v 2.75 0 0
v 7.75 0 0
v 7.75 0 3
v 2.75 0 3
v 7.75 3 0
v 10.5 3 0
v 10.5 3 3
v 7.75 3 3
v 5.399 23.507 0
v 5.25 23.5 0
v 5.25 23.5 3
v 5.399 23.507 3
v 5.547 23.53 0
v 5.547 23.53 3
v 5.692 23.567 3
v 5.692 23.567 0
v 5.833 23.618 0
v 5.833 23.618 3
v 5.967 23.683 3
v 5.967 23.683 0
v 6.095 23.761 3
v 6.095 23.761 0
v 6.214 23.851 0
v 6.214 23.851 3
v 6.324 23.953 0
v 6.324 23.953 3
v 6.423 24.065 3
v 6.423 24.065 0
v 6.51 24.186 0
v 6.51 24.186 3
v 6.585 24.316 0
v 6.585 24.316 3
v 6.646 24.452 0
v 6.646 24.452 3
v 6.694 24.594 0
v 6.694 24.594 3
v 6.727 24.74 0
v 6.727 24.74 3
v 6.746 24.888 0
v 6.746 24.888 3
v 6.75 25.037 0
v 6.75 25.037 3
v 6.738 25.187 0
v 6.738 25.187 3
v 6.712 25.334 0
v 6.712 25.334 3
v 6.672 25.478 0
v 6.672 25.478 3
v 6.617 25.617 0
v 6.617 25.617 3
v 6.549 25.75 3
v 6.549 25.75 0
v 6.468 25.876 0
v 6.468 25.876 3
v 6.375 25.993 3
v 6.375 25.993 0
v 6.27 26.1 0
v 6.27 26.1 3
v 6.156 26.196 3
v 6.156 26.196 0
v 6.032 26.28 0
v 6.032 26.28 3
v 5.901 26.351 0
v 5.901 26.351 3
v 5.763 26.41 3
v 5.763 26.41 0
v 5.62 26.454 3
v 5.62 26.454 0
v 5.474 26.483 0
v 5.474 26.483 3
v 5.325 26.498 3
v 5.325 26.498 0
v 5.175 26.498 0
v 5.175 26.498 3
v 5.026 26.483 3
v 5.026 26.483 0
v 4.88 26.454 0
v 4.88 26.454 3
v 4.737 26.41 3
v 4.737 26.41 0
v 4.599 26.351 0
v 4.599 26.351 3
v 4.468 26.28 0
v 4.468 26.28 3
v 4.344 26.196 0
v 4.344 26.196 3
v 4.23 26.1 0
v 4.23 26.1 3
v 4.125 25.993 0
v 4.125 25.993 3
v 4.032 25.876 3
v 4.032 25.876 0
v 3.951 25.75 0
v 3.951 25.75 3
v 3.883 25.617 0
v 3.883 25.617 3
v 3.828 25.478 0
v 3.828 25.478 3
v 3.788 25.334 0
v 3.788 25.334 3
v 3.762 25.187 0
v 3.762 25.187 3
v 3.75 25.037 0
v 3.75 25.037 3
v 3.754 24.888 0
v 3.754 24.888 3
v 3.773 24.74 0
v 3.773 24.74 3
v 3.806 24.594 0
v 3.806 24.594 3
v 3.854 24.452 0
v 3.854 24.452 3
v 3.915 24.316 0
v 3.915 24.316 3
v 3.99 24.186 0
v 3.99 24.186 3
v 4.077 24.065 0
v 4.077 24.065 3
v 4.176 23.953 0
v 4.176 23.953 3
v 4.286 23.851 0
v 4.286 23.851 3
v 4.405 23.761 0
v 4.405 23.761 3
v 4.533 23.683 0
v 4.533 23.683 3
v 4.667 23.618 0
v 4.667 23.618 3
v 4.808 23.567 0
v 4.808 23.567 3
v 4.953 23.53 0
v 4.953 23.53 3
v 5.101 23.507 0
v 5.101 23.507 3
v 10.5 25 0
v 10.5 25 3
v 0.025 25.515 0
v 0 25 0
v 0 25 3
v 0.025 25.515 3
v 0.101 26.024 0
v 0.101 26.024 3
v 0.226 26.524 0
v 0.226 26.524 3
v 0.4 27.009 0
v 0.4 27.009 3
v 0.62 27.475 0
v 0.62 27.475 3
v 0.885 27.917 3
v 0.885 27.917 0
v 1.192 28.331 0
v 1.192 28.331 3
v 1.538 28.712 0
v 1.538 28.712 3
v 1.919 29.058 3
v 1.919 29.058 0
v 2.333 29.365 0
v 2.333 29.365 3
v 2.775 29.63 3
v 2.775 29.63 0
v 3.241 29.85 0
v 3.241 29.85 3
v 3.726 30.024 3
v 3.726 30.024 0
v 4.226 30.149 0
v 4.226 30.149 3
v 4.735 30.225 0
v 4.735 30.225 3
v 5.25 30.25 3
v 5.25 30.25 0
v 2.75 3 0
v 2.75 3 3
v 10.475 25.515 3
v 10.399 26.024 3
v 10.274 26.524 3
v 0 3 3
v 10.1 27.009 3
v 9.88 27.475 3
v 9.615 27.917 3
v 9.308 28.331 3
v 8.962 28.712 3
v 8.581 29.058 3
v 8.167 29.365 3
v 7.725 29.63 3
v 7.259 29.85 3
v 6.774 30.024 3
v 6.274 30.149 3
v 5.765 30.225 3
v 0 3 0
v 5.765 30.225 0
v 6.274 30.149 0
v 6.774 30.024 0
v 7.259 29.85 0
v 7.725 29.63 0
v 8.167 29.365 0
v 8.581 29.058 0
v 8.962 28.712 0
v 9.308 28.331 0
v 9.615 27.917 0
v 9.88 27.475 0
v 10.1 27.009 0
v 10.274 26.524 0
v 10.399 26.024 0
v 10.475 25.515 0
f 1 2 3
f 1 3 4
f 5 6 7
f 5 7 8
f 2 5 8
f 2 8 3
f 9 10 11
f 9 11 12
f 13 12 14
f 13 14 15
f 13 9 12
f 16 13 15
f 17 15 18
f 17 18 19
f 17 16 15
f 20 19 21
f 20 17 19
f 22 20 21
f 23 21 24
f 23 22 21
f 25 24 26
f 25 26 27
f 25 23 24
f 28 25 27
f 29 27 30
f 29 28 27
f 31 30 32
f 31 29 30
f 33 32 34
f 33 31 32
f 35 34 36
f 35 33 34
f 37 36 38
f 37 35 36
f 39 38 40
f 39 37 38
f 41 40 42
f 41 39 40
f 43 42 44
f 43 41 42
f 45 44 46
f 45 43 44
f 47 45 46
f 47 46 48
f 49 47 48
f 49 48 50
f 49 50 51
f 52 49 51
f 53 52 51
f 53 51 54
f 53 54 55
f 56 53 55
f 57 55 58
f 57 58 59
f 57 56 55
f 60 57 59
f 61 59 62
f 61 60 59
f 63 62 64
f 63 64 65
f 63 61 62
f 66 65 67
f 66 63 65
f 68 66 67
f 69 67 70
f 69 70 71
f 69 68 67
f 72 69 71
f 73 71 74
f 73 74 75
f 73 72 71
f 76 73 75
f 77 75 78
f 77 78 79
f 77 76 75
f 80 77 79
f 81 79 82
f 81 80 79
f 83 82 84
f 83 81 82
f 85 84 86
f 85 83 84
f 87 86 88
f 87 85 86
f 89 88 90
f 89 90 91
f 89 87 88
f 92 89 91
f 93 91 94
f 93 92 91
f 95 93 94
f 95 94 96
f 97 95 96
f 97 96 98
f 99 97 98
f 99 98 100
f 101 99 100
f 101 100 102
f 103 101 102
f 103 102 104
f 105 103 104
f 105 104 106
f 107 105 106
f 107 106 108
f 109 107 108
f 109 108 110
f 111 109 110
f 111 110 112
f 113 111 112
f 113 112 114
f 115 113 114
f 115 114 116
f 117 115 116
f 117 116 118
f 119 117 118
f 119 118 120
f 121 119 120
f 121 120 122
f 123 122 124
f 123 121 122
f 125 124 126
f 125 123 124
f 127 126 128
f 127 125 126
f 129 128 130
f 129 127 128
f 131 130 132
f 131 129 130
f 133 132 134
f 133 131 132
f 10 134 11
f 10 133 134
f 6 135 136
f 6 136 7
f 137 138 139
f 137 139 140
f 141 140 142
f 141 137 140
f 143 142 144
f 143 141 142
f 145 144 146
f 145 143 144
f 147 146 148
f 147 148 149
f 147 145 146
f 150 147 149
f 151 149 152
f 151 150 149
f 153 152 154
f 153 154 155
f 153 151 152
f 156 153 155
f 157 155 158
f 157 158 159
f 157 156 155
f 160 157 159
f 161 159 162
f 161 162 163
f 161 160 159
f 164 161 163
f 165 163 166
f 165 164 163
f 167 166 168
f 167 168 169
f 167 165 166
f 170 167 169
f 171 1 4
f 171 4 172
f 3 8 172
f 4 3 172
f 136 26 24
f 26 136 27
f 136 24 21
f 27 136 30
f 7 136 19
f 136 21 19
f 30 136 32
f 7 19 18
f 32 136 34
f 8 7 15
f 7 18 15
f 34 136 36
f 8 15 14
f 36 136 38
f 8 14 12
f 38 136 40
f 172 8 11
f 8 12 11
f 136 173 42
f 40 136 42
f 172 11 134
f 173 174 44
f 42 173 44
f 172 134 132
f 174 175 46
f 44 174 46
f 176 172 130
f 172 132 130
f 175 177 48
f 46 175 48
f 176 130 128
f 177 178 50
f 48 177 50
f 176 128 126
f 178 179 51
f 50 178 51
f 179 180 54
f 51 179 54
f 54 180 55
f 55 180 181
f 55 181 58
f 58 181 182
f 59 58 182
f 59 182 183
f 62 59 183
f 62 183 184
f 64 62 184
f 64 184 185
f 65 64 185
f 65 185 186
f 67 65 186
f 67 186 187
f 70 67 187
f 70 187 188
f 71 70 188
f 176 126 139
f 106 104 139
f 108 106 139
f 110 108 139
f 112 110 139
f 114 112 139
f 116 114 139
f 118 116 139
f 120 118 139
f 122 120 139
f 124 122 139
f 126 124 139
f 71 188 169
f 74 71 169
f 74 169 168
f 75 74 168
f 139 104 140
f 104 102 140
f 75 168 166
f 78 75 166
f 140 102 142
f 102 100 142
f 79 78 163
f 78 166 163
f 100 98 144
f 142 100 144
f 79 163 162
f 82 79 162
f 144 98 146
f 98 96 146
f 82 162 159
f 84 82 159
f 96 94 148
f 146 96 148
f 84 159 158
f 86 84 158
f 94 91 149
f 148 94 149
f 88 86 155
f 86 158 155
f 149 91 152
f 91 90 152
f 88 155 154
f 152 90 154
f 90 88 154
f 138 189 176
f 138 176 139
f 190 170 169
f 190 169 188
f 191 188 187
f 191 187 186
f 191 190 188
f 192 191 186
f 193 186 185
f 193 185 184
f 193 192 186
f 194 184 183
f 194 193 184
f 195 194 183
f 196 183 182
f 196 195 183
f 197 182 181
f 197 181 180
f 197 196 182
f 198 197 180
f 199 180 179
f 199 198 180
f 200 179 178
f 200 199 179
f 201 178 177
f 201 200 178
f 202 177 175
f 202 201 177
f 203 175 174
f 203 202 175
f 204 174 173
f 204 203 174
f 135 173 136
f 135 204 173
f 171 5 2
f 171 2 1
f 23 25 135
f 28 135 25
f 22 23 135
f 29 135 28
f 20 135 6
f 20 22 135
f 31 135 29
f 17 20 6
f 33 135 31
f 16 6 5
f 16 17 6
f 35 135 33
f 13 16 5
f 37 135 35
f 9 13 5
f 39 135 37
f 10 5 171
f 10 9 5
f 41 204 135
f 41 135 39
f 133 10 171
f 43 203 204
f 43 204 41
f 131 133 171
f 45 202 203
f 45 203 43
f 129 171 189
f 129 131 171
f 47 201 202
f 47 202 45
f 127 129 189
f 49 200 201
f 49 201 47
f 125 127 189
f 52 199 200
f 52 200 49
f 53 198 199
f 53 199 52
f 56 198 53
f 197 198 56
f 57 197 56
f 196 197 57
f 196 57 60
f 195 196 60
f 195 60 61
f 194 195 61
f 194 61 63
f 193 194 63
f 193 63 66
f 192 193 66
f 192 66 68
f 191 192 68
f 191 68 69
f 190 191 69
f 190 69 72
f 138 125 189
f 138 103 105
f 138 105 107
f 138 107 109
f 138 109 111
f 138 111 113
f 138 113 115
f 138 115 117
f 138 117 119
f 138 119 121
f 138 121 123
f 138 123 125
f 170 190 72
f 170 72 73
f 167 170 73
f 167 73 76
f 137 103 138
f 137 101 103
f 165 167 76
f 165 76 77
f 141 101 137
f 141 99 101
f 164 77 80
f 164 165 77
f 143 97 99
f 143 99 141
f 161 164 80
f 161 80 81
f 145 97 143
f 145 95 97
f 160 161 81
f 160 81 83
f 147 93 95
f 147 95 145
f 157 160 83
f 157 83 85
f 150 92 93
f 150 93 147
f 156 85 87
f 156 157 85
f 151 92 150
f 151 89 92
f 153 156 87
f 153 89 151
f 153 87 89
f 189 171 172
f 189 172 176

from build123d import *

# Parameters (mm, degrees)
PLATE_THICKNESS_3MM_DEPTH = 3


with BuildPart() as part:
    # Sketch1 → Plate_thickness_3mm (new body)
    with BuildSketch(Plane.XY):
        with BuildLine():
            Line((10.5, 25), (10.5, 3))
            Line((10.5, 3), (7.75, 3))
            Line((7.75, 3), (7.75, 0))
            Line((7.75, 0), (2.75, 0))
            Line((2.75, 0), (2.75, 3))
            Line((2.75, 3), (0, 3))
            Line((0, 3), (0, 25))
            ThreePointArc((0, 25), (1.537689399, 28.712310601), (5.25, 30.25))
            ThreePointArc((5.25, 30.25), (8.962310601, 28.712310601), (10.5, 25))
        make_face()
        with BuildLine():
            ThreePointArc((5.25, 26.5), (3.75, 25), (5.25, 23.5))
            ThreePointArc((5.25, 23.5), (6.75, 25), (5.25, 26.5))
        make_face(mode=Mode.SUBTRACT)
    extrude(amount=PLATE_THICKNESS_3MM_DEPTH)


solid = part.part
